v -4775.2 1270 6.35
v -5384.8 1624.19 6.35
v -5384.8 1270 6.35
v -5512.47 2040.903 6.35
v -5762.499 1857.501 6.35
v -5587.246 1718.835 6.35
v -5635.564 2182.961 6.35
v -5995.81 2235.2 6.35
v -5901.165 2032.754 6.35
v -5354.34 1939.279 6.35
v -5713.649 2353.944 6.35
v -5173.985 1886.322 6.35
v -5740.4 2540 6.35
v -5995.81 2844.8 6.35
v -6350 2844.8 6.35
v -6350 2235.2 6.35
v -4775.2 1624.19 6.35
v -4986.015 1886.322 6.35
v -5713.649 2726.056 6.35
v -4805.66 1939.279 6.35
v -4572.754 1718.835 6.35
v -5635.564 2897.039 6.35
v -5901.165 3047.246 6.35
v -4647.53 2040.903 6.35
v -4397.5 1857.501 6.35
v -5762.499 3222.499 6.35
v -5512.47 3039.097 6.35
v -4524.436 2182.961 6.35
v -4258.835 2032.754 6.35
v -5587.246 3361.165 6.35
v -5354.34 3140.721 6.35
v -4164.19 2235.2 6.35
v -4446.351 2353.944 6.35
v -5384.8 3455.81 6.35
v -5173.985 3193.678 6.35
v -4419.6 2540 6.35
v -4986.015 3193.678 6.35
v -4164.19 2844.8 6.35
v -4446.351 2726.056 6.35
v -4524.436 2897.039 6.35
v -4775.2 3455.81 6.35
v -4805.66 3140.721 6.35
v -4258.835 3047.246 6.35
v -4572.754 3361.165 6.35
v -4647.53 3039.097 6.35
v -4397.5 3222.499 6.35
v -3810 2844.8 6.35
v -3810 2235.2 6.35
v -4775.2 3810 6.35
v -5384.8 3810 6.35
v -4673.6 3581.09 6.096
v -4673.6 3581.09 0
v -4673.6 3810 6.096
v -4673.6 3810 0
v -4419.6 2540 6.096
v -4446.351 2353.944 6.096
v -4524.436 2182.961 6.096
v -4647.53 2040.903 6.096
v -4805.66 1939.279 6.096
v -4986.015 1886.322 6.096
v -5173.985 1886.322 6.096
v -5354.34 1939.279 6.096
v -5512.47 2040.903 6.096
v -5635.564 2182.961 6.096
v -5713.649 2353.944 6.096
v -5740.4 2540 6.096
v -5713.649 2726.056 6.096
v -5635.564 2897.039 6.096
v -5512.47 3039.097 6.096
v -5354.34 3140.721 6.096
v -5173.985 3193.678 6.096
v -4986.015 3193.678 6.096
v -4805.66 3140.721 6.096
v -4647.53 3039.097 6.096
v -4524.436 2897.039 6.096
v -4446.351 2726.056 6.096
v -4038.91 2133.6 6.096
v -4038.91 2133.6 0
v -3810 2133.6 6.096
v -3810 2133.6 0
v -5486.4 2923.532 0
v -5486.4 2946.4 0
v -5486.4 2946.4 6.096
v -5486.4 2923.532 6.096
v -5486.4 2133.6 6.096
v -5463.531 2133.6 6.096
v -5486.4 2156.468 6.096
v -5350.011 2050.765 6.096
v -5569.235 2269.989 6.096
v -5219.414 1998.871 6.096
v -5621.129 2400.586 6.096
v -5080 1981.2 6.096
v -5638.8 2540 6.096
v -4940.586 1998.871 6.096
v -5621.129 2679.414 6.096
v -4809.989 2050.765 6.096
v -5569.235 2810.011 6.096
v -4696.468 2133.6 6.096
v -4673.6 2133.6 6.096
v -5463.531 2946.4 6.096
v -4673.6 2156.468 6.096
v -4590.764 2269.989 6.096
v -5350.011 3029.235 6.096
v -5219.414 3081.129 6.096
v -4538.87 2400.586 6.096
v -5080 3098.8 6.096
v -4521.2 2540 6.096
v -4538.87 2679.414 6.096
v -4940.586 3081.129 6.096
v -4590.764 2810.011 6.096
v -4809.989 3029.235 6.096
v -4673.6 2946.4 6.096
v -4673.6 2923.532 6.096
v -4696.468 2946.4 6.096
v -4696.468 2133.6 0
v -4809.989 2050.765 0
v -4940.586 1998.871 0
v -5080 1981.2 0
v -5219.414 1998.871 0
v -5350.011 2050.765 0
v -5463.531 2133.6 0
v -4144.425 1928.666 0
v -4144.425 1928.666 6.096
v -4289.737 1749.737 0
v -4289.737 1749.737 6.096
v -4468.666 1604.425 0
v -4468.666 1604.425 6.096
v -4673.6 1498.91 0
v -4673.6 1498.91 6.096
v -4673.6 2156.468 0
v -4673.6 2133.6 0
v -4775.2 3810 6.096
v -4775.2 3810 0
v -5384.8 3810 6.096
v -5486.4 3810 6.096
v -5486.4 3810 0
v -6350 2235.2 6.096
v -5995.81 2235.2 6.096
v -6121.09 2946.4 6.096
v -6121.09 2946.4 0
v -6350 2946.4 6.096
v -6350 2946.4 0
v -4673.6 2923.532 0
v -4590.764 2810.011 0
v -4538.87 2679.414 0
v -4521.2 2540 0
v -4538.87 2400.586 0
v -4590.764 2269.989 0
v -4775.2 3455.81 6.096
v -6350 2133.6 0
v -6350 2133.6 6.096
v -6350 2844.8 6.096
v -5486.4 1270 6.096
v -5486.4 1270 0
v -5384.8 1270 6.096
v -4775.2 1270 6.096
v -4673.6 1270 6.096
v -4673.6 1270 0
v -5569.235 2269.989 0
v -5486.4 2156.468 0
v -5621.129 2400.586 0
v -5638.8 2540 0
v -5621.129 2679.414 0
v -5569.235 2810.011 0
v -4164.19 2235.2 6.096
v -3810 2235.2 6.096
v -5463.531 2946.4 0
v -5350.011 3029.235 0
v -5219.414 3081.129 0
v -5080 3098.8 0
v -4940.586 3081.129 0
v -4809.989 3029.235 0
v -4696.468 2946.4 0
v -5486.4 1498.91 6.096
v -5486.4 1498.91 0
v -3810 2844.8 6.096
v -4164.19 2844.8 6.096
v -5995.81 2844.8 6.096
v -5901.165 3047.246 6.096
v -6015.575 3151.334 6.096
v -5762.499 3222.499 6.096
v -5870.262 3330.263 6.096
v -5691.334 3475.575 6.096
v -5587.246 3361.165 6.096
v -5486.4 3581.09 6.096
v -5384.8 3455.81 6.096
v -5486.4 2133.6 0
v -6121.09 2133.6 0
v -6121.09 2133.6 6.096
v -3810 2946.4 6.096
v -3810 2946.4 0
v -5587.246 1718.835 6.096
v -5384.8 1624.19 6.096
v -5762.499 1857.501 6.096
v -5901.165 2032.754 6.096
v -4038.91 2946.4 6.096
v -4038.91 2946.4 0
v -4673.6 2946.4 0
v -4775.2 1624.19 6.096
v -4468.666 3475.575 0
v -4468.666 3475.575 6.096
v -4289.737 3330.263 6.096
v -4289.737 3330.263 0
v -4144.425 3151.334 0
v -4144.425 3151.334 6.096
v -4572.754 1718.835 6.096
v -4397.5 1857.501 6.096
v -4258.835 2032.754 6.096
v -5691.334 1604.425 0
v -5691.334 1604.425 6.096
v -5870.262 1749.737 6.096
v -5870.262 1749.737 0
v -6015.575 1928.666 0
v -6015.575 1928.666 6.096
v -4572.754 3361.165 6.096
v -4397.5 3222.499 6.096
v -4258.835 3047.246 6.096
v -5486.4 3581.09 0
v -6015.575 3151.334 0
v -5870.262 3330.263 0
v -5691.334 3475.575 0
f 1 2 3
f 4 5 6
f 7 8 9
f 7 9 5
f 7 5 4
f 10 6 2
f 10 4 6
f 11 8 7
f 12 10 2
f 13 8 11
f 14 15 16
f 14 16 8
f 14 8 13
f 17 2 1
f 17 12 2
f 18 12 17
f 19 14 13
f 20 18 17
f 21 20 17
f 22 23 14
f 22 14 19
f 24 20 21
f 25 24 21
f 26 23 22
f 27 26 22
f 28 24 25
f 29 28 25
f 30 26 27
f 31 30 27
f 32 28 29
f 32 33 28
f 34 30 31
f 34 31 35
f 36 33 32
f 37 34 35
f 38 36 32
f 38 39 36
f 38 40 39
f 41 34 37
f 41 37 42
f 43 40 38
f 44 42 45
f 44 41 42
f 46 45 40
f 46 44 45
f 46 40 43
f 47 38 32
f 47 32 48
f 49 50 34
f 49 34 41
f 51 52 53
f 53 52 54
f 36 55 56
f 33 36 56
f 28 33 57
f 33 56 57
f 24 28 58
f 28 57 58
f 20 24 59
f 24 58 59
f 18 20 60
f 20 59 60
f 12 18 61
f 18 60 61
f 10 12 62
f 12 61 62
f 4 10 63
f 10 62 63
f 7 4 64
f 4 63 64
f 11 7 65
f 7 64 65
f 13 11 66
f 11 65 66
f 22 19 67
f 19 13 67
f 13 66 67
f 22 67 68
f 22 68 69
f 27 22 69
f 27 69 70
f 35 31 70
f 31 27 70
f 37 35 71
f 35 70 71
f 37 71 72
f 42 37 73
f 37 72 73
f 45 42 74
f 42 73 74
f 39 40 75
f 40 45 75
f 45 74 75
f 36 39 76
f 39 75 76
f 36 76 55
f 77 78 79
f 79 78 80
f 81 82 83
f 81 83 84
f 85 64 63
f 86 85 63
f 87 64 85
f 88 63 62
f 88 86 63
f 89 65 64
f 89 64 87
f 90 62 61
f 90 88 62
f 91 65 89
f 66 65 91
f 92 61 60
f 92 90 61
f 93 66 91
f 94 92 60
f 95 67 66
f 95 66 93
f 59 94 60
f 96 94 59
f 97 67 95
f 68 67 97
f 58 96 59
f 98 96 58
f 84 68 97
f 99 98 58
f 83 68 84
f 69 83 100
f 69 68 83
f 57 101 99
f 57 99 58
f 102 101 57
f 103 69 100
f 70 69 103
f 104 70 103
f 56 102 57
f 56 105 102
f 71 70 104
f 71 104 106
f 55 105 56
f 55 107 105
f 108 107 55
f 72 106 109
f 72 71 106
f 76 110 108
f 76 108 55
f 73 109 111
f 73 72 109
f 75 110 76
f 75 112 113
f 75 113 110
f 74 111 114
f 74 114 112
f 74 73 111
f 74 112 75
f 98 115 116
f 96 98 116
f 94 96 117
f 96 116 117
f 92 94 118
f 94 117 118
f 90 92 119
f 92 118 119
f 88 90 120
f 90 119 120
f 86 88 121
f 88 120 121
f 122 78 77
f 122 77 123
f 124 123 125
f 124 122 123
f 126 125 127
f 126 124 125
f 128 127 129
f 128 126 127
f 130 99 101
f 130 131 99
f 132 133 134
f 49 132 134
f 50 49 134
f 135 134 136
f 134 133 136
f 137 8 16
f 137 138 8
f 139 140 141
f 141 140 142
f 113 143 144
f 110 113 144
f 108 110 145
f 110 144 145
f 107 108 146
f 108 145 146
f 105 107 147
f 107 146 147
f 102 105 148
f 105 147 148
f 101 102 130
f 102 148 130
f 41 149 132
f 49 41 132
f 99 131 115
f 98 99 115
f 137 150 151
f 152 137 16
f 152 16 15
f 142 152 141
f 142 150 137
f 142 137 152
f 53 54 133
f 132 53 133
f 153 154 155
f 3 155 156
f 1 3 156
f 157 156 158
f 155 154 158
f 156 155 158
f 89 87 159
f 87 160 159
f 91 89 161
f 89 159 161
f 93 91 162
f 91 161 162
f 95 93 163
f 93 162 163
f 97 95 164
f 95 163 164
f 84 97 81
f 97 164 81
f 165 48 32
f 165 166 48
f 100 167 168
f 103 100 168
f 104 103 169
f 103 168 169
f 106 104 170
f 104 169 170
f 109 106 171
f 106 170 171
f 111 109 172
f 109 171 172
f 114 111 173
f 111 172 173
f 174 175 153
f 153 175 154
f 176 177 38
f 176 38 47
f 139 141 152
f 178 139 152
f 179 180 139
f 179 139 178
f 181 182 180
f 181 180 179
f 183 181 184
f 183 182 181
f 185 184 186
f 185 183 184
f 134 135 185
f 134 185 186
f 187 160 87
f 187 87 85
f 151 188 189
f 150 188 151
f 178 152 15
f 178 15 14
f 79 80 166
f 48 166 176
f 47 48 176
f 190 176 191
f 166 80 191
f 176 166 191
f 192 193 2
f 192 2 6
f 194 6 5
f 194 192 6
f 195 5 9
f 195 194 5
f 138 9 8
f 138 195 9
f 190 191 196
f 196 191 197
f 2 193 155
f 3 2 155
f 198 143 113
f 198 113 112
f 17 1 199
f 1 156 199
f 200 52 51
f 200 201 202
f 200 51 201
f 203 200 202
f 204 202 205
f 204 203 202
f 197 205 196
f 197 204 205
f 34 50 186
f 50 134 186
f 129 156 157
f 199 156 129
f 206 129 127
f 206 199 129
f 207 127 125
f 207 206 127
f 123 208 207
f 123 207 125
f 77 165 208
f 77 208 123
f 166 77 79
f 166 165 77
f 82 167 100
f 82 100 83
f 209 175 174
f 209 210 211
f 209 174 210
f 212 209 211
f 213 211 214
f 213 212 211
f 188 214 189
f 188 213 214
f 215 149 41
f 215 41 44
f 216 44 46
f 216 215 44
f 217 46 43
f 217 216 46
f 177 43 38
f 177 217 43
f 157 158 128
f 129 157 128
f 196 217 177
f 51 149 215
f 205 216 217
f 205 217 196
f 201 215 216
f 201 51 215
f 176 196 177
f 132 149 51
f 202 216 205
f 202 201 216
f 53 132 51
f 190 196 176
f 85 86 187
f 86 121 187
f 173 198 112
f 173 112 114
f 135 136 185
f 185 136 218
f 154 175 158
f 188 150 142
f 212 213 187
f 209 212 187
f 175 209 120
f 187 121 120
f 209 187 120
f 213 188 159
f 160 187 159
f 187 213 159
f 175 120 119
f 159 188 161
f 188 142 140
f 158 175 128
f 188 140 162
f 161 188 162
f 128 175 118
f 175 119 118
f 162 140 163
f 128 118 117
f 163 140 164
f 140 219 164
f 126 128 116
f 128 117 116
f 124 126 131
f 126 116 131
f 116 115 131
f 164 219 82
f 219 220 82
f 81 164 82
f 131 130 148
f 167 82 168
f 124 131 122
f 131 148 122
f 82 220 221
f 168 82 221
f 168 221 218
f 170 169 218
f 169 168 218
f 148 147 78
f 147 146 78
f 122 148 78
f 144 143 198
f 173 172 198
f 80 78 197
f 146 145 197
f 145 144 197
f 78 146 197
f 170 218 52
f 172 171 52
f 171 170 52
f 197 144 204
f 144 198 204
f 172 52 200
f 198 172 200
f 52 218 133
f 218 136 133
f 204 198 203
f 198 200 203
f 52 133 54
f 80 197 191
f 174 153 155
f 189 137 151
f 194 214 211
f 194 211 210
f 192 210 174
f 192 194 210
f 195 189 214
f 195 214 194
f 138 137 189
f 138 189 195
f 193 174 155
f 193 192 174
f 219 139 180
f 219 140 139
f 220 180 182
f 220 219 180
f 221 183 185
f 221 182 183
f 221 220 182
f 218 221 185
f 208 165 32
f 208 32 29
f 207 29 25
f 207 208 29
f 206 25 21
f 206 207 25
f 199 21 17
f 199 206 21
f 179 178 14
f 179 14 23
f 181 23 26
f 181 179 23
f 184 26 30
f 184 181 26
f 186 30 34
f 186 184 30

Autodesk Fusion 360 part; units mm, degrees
sketch "Sketch1" plane through (0, 0, 0) normal (0, 0, 1) x (1, 0, 0)
  circle A0 centre (-5079.9999, 2540) radius 660.4
  circle A1 centre (-5079.9999, 2540) radius 965.2
  line L0 (-6349.9999, 2844.8) -> (-3809.9999, 2844.8)
  line L1 (-3809.9999, 2844.8) -> (-3809.9999, 2235.2)
  line L2 (-3809.9999, 2235.2) -> (-6349.9999, 2235.2)
  line L3 (-6349.9999, 2235.2) -> (-6349.9999, 2844.8)
  line L4 (-6349.9999, 2844.8) -> (-3809.9999, 2235.2) construction
  line L5 (-3809.9999, 2844.8) -> (-6349.9999, 2235.2) construction
  line L6 (-4775.1999, 3810) -> (-5384.7999, 3810)
  line L7 (-5384.7999, 3810) -> (-5384.7999, 1270)
  line L8 (-5384.7999, 1270) -> (-4775.1999, 1270)
  line L9 (-4775.1999, 1270) -> (-4775.1999, 3810)
  line L10 (-4775.1999, 3810) -> (-5384.7999, 1270) construction
  line L11 (-5384.7999, 3810) -> (-4775.1999, 1270) construction
  line L12 (-6349.9999, 2235.2) -> (-3845.6793, 2235.2)
  line L13 (-3845.6793, 2235.2) -> (-3845.6793, 2133.6)
  line L14 (-3845.6793, 2133.6) -> (-6349.9999, 2133.6)
  line L15 (-6349.9999, 2133.6) -> (-6349.9999, 2235.2)
  line L16 (-6349.9999, 2844.8) -> (-3809.9999, 2844.8)
  line L17 (-3809.9999, 2844.8) -> (-3809.9999, 2946.4)
  line L18 (-3809.9999, 2946.4) -> (-6349.9999, 2946.4)
  line L19 (-6349.9999, 2946.4) -> (-6349.9999, 2844.8)
  line L20 (-5384.7999, 3810) -> (-5486.3999, 3810)
  line L21 (-5486.3999, 3810) -> (-5486.3999, 1270)
  line L22 (-5486.3999, 1270) -> (-5384.7999, 1270)
  line L23 (-5384.7999, 1270) -> (-5384.7999, 3810)
  line L24 (-4775.1999, 1270) -> (-4673.5999, 1270)
  line L25 (-4673.5999, 1270) -> (-4673.5999, 3809.9999)
  line L26 (-4673.5999, 3809.9999) -> (-4775.1999, 3809.9999)
  line L27 (-4775.1999, 3809.9999) -> (-4775.1999, 1270)
  circle A2 centre (-5079.9999, 2540) radius 558.8
  circle A3 centre (-5079.9999, 2540) radius 1117.6
  line L28 (-3845.6793, 2133.6) -> (-3809.9999, 2133.6)
  line L29 (-3809.9999, 2133.6) -> (-3809.9999, 2235.2)
  line L30 (-3809.9999, 2235.2) -> (-3845.6793, 2235.2)
  line L31 (-3845.6793, 2235.2) -> (-3845.6793, 2133.6)
  point P0 (-5079.9999, 2540)
  point P1 (-5079.9999, 2540)
  dimension "d1" = 1320.8
  dimension "d2" = 1930.4
  dimension "d3" = 2540
  dimension "d4" = 609.6
  dimension "d5" = 609.6
  dimension "d6" = 2540
  dimension "d7" = 101.6
  dimension "d8" = 101.6
  dimension "d9" = 101.6
  dimension "d10" = 101.6
  dimension "d11" = 1117.6
  dimension "d12" = 2235.2
extrude "Extrude1" add sketch "Sketch1" along normal blind 6.35 contours A0 A1 L0 L2 L12 L16 | A0 A1 L0 L16 L18 | A0 A1 L2 L12 L14 | A0 A1 L18 L25 | A1 L0 L2 L12 L16 A3 | A0 A1 L14 L25 | A0 A1 L9 L25 L27 | L0 L1 L2 L12 L16 A3 L30 | A0 A1 L9 L25 L27 | A0 A1 L7 L9 L23 L27 | A0 A1 L7 L9 L23 L27 | A0 A1 L7 L21 L23 | A1 L7 L9 L23 L27 A3 | A0 A1 L7 L21 L23 | A1 L7 L9 L23 L27 A3 | A0 A1 L18 L21 | L6 L7 L9 L23 L27 A3 | A0 A1 L14 L21 | L7 L8 L9 L23 L27 A3 | A0 A1 L0 L16 L18 | A0 A1 L2 L12 L14 | A0 A1 L0 L2 L12 L16 | A1 L0 L2 L12 L16 A3 | L0 L2 L3 L12 L16 A3
extrude "Extrude2" add sketch "Sketch1" along normal blind 6.096 contours A0 L0 L2 L12 L16 A2 | A0 L0 L16 L18 L25 A2 | A0 L2 L12 L14 L25 A2 | A0 L18 L25 | A1 L0 L16 L18 A3 | A0 L14 L25 | A1 L2 L12 L14 A3 | A0 L9 L18 L25 L27 A2 | A1 L18 L25 A3 | L0 L16 L17 L18 A3 | A0 L9 L14 L25 L27 A2 | A1 L14 L25 A3 | L2 L12 L13 L14 A3 L31 | A0 L7 L9 L23 L27 A2 | A1 L9 L25 L27 A3 | A0 L7 L9 L23 L27 A2 | A1 L9 L25 L27 A3 | A0 L7 L18 L21 L23 A2 | L9 L25 L26 L27 A3 | A0 L7 L14 L21 L23 A2 | L9 L24 L25 L27 A3 | A0 L18 L21 | A1 L7 L21 L23 A3 | A0 L14 L21 | A1 L7 L21 L23 A3 | A0 L0 L16 L18 L21 A2 | A1 L18 L21 A3 | L7 L20 L21 L23 A3 | A0 L0 L2 L12 L16 A2 | A0 L2 L12 L14 L21 A2 | A1 L14 L21 A3 | L7 L21 L22 L23 A3 | A1 L0 L16 L18 A3 | A1 L2 L12 L14 A3 | L0 L16 L18 L19 A3 | L2 L12 L14 L15 A3
extrude "Extrude3" add sketch "Sketch1" along normal blind 6.096 contours L2 L13 L28 L29 L30 L31
